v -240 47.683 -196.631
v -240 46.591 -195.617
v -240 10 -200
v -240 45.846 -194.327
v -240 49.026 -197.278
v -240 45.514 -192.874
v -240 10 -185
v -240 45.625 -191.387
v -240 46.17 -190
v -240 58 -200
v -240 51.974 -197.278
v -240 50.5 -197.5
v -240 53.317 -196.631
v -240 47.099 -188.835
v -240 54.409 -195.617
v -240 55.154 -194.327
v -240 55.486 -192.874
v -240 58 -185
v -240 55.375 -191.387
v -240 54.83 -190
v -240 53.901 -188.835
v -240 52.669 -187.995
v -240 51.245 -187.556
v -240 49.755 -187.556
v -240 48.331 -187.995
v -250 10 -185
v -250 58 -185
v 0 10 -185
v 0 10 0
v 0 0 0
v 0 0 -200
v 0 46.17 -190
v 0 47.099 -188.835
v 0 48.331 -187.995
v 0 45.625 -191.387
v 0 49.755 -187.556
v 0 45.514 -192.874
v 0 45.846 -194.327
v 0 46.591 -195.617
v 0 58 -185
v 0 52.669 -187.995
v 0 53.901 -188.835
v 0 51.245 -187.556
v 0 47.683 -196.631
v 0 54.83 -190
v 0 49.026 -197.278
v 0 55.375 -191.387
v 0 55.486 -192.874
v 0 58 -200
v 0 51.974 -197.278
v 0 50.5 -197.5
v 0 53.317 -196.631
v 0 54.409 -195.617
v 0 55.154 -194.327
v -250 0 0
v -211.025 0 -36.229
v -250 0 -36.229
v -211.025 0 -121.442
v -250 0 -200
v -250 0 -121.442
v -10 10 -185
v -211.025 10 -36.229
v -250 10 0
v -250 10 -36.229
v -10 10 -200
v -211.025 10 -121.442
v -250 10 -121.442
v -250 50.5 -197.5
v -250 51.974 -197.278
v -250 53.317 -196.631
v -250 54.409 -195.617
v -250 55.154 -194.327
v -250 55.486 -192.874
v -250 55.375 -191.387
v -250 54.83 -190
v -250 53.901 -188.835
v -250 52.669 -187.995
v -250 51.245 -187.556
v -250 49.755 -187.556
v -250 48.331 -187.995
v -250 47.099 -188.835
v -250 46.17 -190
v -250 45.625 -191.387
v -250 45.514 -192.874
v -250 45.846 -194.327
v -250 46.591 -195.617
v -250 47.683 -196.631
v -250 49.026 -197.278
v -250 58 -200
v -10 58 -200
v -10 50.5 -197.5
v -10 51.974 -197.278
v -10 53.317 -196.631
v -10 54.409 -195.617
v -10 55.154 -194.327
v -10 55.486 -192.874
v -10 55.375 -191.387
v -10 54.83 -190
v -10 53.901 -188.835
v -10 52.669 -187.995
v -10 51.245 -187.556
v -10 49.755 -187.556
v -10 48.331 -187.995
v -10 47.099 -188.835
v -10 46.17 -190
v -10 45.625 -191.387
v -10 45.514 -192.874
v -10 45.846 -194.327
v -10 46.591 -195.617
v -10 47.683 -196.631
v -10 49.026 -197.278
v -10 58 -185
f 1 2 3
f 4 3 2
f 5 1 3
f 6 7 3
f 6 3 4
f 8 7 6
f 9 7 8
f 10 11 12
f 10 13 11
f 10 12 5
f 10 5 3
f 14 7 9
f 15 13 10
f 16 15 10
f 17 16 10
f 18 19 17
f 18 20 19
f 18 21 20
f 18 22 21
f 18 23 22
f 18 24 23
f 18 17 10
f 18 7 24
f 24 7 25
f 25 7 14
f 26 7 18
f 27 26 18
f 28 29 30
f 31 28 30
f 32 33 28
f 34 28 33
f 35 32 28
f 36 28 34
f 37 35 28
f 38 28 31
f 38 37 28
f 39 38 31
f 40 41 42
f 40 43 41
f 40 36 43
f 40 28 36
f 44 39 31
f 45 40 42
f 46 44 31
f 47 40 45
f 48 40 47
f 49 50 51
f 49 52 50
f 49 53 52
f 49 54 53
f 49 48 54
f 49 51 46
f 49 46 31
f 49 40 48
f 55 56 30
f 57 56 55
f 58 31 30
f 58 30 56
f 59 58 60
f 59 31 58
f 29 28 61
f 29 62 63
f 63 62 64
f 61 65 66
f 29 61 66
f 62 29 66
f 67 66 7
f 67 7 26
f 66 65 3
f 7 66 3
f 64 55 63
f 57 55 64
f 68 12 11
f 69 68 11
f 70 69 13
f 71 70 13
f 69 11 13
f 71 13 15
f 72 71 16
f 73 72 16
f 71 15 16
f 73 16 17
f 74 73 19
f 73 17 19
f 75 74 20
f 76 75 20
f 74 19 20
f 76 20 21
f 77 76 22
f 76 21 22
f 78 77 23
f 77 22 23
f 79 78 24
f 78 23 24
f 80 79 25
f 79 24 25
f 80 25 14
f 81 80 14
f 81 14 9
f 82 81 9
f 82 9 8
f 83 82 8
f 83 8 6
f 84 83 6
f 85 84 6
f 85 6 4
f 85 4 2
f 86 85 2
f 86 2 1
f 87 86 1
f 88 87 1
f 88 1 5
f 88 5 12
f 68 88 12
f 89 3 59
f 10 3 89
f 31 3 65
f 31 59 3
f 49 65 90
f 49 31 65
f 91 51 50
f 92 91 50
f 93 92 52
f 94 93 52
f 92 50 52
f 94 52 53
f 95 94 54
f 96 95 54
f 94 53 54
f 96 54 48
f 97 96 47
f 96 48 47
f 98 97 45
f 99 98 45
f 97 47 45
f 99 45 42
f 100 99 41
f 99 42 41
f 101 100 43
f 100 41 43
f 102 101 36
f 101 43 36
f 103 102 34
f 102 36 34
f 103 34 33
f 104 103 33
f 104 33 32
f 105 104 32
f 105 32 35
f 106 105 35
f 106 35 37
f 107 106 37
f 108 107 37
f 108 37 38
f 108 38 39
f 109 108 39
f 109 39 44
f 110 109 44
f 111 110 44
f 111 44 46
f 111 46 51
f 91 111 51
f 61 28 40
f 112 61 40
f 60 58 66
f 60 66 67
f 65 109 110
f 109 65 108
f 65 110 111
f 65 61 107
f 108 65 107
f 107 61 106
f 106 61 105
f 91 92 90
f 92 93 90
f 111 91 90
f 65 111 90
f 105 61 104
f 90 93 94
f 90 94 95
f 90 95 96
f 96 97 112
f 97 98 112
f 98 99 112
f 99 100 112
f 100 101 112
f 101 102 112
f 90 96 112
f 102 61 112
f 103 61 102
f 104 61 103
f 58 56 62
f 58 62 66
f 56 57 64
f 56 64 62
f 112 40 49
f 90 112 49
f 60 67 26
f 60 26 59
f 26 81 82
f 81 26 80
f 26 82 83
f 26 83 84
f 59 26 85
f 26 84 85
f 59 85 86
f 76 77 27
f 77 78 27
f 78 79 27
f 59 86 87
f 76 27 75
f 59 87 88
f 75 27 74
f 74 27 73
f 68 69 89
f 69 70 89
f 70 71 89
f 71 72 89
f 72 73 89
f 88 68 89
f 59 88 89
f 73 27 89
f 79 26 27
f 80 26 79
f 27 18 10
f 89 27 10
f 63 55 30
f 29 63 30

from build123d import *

# Parameters (mm, degrees)
BOSS_EXTRU_1_DEPTH      = 10
ESQUISSE2_W             = 15
ESQUISSE2_H             = 48
BOSS_EXTRU_2_DEPTH      = 250
ESQUISSE5_W             = 230
ESQUISSE5_H             = 48
ENL_V_MAT_EXTRU_1_DEPTH = 15
ESQUISSE6_R             = 5
ENL_V_MAT_EXTRU_2_DEPTH = 250


with BuildPart() as part:
    # Esquisse1 → Boss.-Extru.1 (new body)
    with BuildSketch(Plane(origin=(0, 0, 0), x_dir=(1, 0, 0), z_dir=(0, 1, 0))):
        Polygon((-210, 0), (-250, 0), (-250, 36.228880697), (-211.024769455, 36.228880697), (-211.024769455, 121.442108629), (-250, 121.442108629), (-250, 200), (-211.024769455, 200), (0, 200), (0, 0), align=None)
    extrude(amount=BOSS_EXTRU_1_DEPTH)

    # Esquisse2 → Boss.-Extru.2 (add)
    with BuildSketch(Plane(origin=(0, 0, 0), x_dir=(0, 0, -1), z_dir=(1, 0, 0))):
        with Locations((192.5, 34)):
            Rectangle(ESQUISSE2_W, ESQUISSE2_H)
    extrude(amount=-BOSS_EXTRU_2_DEPTH)

    # Esquisse5 → Enlèv. mat.-Extru.1 (cut)
    with BuildSketch(Plane.XY.offset(-185)):
        with Locations((-125, 34)):
            Rectangle(ESQUISSE5_W, ESQUISSE5_H)
    extrude(amount=-ENL_V_MAT_EXTRU_1_DEPTH, mode=Mode.SUBTRACT)

    # Esquisse6 → Enlèv. mat.-Extru.2 (cut)
    with BuildSketch(Plane(origin=(0, 0, 0), x_dir=(0, 0, -1), z_dir=(1, 0, 0))):
        with Locations((192.5, 50.5)):
            Circle(ESQUISSE6_R)
    extrude(amount=-ENL_V_MAT_EXTRU_2_DEPTH, mode=Mode.SUBTRACT)


solid = part.part
